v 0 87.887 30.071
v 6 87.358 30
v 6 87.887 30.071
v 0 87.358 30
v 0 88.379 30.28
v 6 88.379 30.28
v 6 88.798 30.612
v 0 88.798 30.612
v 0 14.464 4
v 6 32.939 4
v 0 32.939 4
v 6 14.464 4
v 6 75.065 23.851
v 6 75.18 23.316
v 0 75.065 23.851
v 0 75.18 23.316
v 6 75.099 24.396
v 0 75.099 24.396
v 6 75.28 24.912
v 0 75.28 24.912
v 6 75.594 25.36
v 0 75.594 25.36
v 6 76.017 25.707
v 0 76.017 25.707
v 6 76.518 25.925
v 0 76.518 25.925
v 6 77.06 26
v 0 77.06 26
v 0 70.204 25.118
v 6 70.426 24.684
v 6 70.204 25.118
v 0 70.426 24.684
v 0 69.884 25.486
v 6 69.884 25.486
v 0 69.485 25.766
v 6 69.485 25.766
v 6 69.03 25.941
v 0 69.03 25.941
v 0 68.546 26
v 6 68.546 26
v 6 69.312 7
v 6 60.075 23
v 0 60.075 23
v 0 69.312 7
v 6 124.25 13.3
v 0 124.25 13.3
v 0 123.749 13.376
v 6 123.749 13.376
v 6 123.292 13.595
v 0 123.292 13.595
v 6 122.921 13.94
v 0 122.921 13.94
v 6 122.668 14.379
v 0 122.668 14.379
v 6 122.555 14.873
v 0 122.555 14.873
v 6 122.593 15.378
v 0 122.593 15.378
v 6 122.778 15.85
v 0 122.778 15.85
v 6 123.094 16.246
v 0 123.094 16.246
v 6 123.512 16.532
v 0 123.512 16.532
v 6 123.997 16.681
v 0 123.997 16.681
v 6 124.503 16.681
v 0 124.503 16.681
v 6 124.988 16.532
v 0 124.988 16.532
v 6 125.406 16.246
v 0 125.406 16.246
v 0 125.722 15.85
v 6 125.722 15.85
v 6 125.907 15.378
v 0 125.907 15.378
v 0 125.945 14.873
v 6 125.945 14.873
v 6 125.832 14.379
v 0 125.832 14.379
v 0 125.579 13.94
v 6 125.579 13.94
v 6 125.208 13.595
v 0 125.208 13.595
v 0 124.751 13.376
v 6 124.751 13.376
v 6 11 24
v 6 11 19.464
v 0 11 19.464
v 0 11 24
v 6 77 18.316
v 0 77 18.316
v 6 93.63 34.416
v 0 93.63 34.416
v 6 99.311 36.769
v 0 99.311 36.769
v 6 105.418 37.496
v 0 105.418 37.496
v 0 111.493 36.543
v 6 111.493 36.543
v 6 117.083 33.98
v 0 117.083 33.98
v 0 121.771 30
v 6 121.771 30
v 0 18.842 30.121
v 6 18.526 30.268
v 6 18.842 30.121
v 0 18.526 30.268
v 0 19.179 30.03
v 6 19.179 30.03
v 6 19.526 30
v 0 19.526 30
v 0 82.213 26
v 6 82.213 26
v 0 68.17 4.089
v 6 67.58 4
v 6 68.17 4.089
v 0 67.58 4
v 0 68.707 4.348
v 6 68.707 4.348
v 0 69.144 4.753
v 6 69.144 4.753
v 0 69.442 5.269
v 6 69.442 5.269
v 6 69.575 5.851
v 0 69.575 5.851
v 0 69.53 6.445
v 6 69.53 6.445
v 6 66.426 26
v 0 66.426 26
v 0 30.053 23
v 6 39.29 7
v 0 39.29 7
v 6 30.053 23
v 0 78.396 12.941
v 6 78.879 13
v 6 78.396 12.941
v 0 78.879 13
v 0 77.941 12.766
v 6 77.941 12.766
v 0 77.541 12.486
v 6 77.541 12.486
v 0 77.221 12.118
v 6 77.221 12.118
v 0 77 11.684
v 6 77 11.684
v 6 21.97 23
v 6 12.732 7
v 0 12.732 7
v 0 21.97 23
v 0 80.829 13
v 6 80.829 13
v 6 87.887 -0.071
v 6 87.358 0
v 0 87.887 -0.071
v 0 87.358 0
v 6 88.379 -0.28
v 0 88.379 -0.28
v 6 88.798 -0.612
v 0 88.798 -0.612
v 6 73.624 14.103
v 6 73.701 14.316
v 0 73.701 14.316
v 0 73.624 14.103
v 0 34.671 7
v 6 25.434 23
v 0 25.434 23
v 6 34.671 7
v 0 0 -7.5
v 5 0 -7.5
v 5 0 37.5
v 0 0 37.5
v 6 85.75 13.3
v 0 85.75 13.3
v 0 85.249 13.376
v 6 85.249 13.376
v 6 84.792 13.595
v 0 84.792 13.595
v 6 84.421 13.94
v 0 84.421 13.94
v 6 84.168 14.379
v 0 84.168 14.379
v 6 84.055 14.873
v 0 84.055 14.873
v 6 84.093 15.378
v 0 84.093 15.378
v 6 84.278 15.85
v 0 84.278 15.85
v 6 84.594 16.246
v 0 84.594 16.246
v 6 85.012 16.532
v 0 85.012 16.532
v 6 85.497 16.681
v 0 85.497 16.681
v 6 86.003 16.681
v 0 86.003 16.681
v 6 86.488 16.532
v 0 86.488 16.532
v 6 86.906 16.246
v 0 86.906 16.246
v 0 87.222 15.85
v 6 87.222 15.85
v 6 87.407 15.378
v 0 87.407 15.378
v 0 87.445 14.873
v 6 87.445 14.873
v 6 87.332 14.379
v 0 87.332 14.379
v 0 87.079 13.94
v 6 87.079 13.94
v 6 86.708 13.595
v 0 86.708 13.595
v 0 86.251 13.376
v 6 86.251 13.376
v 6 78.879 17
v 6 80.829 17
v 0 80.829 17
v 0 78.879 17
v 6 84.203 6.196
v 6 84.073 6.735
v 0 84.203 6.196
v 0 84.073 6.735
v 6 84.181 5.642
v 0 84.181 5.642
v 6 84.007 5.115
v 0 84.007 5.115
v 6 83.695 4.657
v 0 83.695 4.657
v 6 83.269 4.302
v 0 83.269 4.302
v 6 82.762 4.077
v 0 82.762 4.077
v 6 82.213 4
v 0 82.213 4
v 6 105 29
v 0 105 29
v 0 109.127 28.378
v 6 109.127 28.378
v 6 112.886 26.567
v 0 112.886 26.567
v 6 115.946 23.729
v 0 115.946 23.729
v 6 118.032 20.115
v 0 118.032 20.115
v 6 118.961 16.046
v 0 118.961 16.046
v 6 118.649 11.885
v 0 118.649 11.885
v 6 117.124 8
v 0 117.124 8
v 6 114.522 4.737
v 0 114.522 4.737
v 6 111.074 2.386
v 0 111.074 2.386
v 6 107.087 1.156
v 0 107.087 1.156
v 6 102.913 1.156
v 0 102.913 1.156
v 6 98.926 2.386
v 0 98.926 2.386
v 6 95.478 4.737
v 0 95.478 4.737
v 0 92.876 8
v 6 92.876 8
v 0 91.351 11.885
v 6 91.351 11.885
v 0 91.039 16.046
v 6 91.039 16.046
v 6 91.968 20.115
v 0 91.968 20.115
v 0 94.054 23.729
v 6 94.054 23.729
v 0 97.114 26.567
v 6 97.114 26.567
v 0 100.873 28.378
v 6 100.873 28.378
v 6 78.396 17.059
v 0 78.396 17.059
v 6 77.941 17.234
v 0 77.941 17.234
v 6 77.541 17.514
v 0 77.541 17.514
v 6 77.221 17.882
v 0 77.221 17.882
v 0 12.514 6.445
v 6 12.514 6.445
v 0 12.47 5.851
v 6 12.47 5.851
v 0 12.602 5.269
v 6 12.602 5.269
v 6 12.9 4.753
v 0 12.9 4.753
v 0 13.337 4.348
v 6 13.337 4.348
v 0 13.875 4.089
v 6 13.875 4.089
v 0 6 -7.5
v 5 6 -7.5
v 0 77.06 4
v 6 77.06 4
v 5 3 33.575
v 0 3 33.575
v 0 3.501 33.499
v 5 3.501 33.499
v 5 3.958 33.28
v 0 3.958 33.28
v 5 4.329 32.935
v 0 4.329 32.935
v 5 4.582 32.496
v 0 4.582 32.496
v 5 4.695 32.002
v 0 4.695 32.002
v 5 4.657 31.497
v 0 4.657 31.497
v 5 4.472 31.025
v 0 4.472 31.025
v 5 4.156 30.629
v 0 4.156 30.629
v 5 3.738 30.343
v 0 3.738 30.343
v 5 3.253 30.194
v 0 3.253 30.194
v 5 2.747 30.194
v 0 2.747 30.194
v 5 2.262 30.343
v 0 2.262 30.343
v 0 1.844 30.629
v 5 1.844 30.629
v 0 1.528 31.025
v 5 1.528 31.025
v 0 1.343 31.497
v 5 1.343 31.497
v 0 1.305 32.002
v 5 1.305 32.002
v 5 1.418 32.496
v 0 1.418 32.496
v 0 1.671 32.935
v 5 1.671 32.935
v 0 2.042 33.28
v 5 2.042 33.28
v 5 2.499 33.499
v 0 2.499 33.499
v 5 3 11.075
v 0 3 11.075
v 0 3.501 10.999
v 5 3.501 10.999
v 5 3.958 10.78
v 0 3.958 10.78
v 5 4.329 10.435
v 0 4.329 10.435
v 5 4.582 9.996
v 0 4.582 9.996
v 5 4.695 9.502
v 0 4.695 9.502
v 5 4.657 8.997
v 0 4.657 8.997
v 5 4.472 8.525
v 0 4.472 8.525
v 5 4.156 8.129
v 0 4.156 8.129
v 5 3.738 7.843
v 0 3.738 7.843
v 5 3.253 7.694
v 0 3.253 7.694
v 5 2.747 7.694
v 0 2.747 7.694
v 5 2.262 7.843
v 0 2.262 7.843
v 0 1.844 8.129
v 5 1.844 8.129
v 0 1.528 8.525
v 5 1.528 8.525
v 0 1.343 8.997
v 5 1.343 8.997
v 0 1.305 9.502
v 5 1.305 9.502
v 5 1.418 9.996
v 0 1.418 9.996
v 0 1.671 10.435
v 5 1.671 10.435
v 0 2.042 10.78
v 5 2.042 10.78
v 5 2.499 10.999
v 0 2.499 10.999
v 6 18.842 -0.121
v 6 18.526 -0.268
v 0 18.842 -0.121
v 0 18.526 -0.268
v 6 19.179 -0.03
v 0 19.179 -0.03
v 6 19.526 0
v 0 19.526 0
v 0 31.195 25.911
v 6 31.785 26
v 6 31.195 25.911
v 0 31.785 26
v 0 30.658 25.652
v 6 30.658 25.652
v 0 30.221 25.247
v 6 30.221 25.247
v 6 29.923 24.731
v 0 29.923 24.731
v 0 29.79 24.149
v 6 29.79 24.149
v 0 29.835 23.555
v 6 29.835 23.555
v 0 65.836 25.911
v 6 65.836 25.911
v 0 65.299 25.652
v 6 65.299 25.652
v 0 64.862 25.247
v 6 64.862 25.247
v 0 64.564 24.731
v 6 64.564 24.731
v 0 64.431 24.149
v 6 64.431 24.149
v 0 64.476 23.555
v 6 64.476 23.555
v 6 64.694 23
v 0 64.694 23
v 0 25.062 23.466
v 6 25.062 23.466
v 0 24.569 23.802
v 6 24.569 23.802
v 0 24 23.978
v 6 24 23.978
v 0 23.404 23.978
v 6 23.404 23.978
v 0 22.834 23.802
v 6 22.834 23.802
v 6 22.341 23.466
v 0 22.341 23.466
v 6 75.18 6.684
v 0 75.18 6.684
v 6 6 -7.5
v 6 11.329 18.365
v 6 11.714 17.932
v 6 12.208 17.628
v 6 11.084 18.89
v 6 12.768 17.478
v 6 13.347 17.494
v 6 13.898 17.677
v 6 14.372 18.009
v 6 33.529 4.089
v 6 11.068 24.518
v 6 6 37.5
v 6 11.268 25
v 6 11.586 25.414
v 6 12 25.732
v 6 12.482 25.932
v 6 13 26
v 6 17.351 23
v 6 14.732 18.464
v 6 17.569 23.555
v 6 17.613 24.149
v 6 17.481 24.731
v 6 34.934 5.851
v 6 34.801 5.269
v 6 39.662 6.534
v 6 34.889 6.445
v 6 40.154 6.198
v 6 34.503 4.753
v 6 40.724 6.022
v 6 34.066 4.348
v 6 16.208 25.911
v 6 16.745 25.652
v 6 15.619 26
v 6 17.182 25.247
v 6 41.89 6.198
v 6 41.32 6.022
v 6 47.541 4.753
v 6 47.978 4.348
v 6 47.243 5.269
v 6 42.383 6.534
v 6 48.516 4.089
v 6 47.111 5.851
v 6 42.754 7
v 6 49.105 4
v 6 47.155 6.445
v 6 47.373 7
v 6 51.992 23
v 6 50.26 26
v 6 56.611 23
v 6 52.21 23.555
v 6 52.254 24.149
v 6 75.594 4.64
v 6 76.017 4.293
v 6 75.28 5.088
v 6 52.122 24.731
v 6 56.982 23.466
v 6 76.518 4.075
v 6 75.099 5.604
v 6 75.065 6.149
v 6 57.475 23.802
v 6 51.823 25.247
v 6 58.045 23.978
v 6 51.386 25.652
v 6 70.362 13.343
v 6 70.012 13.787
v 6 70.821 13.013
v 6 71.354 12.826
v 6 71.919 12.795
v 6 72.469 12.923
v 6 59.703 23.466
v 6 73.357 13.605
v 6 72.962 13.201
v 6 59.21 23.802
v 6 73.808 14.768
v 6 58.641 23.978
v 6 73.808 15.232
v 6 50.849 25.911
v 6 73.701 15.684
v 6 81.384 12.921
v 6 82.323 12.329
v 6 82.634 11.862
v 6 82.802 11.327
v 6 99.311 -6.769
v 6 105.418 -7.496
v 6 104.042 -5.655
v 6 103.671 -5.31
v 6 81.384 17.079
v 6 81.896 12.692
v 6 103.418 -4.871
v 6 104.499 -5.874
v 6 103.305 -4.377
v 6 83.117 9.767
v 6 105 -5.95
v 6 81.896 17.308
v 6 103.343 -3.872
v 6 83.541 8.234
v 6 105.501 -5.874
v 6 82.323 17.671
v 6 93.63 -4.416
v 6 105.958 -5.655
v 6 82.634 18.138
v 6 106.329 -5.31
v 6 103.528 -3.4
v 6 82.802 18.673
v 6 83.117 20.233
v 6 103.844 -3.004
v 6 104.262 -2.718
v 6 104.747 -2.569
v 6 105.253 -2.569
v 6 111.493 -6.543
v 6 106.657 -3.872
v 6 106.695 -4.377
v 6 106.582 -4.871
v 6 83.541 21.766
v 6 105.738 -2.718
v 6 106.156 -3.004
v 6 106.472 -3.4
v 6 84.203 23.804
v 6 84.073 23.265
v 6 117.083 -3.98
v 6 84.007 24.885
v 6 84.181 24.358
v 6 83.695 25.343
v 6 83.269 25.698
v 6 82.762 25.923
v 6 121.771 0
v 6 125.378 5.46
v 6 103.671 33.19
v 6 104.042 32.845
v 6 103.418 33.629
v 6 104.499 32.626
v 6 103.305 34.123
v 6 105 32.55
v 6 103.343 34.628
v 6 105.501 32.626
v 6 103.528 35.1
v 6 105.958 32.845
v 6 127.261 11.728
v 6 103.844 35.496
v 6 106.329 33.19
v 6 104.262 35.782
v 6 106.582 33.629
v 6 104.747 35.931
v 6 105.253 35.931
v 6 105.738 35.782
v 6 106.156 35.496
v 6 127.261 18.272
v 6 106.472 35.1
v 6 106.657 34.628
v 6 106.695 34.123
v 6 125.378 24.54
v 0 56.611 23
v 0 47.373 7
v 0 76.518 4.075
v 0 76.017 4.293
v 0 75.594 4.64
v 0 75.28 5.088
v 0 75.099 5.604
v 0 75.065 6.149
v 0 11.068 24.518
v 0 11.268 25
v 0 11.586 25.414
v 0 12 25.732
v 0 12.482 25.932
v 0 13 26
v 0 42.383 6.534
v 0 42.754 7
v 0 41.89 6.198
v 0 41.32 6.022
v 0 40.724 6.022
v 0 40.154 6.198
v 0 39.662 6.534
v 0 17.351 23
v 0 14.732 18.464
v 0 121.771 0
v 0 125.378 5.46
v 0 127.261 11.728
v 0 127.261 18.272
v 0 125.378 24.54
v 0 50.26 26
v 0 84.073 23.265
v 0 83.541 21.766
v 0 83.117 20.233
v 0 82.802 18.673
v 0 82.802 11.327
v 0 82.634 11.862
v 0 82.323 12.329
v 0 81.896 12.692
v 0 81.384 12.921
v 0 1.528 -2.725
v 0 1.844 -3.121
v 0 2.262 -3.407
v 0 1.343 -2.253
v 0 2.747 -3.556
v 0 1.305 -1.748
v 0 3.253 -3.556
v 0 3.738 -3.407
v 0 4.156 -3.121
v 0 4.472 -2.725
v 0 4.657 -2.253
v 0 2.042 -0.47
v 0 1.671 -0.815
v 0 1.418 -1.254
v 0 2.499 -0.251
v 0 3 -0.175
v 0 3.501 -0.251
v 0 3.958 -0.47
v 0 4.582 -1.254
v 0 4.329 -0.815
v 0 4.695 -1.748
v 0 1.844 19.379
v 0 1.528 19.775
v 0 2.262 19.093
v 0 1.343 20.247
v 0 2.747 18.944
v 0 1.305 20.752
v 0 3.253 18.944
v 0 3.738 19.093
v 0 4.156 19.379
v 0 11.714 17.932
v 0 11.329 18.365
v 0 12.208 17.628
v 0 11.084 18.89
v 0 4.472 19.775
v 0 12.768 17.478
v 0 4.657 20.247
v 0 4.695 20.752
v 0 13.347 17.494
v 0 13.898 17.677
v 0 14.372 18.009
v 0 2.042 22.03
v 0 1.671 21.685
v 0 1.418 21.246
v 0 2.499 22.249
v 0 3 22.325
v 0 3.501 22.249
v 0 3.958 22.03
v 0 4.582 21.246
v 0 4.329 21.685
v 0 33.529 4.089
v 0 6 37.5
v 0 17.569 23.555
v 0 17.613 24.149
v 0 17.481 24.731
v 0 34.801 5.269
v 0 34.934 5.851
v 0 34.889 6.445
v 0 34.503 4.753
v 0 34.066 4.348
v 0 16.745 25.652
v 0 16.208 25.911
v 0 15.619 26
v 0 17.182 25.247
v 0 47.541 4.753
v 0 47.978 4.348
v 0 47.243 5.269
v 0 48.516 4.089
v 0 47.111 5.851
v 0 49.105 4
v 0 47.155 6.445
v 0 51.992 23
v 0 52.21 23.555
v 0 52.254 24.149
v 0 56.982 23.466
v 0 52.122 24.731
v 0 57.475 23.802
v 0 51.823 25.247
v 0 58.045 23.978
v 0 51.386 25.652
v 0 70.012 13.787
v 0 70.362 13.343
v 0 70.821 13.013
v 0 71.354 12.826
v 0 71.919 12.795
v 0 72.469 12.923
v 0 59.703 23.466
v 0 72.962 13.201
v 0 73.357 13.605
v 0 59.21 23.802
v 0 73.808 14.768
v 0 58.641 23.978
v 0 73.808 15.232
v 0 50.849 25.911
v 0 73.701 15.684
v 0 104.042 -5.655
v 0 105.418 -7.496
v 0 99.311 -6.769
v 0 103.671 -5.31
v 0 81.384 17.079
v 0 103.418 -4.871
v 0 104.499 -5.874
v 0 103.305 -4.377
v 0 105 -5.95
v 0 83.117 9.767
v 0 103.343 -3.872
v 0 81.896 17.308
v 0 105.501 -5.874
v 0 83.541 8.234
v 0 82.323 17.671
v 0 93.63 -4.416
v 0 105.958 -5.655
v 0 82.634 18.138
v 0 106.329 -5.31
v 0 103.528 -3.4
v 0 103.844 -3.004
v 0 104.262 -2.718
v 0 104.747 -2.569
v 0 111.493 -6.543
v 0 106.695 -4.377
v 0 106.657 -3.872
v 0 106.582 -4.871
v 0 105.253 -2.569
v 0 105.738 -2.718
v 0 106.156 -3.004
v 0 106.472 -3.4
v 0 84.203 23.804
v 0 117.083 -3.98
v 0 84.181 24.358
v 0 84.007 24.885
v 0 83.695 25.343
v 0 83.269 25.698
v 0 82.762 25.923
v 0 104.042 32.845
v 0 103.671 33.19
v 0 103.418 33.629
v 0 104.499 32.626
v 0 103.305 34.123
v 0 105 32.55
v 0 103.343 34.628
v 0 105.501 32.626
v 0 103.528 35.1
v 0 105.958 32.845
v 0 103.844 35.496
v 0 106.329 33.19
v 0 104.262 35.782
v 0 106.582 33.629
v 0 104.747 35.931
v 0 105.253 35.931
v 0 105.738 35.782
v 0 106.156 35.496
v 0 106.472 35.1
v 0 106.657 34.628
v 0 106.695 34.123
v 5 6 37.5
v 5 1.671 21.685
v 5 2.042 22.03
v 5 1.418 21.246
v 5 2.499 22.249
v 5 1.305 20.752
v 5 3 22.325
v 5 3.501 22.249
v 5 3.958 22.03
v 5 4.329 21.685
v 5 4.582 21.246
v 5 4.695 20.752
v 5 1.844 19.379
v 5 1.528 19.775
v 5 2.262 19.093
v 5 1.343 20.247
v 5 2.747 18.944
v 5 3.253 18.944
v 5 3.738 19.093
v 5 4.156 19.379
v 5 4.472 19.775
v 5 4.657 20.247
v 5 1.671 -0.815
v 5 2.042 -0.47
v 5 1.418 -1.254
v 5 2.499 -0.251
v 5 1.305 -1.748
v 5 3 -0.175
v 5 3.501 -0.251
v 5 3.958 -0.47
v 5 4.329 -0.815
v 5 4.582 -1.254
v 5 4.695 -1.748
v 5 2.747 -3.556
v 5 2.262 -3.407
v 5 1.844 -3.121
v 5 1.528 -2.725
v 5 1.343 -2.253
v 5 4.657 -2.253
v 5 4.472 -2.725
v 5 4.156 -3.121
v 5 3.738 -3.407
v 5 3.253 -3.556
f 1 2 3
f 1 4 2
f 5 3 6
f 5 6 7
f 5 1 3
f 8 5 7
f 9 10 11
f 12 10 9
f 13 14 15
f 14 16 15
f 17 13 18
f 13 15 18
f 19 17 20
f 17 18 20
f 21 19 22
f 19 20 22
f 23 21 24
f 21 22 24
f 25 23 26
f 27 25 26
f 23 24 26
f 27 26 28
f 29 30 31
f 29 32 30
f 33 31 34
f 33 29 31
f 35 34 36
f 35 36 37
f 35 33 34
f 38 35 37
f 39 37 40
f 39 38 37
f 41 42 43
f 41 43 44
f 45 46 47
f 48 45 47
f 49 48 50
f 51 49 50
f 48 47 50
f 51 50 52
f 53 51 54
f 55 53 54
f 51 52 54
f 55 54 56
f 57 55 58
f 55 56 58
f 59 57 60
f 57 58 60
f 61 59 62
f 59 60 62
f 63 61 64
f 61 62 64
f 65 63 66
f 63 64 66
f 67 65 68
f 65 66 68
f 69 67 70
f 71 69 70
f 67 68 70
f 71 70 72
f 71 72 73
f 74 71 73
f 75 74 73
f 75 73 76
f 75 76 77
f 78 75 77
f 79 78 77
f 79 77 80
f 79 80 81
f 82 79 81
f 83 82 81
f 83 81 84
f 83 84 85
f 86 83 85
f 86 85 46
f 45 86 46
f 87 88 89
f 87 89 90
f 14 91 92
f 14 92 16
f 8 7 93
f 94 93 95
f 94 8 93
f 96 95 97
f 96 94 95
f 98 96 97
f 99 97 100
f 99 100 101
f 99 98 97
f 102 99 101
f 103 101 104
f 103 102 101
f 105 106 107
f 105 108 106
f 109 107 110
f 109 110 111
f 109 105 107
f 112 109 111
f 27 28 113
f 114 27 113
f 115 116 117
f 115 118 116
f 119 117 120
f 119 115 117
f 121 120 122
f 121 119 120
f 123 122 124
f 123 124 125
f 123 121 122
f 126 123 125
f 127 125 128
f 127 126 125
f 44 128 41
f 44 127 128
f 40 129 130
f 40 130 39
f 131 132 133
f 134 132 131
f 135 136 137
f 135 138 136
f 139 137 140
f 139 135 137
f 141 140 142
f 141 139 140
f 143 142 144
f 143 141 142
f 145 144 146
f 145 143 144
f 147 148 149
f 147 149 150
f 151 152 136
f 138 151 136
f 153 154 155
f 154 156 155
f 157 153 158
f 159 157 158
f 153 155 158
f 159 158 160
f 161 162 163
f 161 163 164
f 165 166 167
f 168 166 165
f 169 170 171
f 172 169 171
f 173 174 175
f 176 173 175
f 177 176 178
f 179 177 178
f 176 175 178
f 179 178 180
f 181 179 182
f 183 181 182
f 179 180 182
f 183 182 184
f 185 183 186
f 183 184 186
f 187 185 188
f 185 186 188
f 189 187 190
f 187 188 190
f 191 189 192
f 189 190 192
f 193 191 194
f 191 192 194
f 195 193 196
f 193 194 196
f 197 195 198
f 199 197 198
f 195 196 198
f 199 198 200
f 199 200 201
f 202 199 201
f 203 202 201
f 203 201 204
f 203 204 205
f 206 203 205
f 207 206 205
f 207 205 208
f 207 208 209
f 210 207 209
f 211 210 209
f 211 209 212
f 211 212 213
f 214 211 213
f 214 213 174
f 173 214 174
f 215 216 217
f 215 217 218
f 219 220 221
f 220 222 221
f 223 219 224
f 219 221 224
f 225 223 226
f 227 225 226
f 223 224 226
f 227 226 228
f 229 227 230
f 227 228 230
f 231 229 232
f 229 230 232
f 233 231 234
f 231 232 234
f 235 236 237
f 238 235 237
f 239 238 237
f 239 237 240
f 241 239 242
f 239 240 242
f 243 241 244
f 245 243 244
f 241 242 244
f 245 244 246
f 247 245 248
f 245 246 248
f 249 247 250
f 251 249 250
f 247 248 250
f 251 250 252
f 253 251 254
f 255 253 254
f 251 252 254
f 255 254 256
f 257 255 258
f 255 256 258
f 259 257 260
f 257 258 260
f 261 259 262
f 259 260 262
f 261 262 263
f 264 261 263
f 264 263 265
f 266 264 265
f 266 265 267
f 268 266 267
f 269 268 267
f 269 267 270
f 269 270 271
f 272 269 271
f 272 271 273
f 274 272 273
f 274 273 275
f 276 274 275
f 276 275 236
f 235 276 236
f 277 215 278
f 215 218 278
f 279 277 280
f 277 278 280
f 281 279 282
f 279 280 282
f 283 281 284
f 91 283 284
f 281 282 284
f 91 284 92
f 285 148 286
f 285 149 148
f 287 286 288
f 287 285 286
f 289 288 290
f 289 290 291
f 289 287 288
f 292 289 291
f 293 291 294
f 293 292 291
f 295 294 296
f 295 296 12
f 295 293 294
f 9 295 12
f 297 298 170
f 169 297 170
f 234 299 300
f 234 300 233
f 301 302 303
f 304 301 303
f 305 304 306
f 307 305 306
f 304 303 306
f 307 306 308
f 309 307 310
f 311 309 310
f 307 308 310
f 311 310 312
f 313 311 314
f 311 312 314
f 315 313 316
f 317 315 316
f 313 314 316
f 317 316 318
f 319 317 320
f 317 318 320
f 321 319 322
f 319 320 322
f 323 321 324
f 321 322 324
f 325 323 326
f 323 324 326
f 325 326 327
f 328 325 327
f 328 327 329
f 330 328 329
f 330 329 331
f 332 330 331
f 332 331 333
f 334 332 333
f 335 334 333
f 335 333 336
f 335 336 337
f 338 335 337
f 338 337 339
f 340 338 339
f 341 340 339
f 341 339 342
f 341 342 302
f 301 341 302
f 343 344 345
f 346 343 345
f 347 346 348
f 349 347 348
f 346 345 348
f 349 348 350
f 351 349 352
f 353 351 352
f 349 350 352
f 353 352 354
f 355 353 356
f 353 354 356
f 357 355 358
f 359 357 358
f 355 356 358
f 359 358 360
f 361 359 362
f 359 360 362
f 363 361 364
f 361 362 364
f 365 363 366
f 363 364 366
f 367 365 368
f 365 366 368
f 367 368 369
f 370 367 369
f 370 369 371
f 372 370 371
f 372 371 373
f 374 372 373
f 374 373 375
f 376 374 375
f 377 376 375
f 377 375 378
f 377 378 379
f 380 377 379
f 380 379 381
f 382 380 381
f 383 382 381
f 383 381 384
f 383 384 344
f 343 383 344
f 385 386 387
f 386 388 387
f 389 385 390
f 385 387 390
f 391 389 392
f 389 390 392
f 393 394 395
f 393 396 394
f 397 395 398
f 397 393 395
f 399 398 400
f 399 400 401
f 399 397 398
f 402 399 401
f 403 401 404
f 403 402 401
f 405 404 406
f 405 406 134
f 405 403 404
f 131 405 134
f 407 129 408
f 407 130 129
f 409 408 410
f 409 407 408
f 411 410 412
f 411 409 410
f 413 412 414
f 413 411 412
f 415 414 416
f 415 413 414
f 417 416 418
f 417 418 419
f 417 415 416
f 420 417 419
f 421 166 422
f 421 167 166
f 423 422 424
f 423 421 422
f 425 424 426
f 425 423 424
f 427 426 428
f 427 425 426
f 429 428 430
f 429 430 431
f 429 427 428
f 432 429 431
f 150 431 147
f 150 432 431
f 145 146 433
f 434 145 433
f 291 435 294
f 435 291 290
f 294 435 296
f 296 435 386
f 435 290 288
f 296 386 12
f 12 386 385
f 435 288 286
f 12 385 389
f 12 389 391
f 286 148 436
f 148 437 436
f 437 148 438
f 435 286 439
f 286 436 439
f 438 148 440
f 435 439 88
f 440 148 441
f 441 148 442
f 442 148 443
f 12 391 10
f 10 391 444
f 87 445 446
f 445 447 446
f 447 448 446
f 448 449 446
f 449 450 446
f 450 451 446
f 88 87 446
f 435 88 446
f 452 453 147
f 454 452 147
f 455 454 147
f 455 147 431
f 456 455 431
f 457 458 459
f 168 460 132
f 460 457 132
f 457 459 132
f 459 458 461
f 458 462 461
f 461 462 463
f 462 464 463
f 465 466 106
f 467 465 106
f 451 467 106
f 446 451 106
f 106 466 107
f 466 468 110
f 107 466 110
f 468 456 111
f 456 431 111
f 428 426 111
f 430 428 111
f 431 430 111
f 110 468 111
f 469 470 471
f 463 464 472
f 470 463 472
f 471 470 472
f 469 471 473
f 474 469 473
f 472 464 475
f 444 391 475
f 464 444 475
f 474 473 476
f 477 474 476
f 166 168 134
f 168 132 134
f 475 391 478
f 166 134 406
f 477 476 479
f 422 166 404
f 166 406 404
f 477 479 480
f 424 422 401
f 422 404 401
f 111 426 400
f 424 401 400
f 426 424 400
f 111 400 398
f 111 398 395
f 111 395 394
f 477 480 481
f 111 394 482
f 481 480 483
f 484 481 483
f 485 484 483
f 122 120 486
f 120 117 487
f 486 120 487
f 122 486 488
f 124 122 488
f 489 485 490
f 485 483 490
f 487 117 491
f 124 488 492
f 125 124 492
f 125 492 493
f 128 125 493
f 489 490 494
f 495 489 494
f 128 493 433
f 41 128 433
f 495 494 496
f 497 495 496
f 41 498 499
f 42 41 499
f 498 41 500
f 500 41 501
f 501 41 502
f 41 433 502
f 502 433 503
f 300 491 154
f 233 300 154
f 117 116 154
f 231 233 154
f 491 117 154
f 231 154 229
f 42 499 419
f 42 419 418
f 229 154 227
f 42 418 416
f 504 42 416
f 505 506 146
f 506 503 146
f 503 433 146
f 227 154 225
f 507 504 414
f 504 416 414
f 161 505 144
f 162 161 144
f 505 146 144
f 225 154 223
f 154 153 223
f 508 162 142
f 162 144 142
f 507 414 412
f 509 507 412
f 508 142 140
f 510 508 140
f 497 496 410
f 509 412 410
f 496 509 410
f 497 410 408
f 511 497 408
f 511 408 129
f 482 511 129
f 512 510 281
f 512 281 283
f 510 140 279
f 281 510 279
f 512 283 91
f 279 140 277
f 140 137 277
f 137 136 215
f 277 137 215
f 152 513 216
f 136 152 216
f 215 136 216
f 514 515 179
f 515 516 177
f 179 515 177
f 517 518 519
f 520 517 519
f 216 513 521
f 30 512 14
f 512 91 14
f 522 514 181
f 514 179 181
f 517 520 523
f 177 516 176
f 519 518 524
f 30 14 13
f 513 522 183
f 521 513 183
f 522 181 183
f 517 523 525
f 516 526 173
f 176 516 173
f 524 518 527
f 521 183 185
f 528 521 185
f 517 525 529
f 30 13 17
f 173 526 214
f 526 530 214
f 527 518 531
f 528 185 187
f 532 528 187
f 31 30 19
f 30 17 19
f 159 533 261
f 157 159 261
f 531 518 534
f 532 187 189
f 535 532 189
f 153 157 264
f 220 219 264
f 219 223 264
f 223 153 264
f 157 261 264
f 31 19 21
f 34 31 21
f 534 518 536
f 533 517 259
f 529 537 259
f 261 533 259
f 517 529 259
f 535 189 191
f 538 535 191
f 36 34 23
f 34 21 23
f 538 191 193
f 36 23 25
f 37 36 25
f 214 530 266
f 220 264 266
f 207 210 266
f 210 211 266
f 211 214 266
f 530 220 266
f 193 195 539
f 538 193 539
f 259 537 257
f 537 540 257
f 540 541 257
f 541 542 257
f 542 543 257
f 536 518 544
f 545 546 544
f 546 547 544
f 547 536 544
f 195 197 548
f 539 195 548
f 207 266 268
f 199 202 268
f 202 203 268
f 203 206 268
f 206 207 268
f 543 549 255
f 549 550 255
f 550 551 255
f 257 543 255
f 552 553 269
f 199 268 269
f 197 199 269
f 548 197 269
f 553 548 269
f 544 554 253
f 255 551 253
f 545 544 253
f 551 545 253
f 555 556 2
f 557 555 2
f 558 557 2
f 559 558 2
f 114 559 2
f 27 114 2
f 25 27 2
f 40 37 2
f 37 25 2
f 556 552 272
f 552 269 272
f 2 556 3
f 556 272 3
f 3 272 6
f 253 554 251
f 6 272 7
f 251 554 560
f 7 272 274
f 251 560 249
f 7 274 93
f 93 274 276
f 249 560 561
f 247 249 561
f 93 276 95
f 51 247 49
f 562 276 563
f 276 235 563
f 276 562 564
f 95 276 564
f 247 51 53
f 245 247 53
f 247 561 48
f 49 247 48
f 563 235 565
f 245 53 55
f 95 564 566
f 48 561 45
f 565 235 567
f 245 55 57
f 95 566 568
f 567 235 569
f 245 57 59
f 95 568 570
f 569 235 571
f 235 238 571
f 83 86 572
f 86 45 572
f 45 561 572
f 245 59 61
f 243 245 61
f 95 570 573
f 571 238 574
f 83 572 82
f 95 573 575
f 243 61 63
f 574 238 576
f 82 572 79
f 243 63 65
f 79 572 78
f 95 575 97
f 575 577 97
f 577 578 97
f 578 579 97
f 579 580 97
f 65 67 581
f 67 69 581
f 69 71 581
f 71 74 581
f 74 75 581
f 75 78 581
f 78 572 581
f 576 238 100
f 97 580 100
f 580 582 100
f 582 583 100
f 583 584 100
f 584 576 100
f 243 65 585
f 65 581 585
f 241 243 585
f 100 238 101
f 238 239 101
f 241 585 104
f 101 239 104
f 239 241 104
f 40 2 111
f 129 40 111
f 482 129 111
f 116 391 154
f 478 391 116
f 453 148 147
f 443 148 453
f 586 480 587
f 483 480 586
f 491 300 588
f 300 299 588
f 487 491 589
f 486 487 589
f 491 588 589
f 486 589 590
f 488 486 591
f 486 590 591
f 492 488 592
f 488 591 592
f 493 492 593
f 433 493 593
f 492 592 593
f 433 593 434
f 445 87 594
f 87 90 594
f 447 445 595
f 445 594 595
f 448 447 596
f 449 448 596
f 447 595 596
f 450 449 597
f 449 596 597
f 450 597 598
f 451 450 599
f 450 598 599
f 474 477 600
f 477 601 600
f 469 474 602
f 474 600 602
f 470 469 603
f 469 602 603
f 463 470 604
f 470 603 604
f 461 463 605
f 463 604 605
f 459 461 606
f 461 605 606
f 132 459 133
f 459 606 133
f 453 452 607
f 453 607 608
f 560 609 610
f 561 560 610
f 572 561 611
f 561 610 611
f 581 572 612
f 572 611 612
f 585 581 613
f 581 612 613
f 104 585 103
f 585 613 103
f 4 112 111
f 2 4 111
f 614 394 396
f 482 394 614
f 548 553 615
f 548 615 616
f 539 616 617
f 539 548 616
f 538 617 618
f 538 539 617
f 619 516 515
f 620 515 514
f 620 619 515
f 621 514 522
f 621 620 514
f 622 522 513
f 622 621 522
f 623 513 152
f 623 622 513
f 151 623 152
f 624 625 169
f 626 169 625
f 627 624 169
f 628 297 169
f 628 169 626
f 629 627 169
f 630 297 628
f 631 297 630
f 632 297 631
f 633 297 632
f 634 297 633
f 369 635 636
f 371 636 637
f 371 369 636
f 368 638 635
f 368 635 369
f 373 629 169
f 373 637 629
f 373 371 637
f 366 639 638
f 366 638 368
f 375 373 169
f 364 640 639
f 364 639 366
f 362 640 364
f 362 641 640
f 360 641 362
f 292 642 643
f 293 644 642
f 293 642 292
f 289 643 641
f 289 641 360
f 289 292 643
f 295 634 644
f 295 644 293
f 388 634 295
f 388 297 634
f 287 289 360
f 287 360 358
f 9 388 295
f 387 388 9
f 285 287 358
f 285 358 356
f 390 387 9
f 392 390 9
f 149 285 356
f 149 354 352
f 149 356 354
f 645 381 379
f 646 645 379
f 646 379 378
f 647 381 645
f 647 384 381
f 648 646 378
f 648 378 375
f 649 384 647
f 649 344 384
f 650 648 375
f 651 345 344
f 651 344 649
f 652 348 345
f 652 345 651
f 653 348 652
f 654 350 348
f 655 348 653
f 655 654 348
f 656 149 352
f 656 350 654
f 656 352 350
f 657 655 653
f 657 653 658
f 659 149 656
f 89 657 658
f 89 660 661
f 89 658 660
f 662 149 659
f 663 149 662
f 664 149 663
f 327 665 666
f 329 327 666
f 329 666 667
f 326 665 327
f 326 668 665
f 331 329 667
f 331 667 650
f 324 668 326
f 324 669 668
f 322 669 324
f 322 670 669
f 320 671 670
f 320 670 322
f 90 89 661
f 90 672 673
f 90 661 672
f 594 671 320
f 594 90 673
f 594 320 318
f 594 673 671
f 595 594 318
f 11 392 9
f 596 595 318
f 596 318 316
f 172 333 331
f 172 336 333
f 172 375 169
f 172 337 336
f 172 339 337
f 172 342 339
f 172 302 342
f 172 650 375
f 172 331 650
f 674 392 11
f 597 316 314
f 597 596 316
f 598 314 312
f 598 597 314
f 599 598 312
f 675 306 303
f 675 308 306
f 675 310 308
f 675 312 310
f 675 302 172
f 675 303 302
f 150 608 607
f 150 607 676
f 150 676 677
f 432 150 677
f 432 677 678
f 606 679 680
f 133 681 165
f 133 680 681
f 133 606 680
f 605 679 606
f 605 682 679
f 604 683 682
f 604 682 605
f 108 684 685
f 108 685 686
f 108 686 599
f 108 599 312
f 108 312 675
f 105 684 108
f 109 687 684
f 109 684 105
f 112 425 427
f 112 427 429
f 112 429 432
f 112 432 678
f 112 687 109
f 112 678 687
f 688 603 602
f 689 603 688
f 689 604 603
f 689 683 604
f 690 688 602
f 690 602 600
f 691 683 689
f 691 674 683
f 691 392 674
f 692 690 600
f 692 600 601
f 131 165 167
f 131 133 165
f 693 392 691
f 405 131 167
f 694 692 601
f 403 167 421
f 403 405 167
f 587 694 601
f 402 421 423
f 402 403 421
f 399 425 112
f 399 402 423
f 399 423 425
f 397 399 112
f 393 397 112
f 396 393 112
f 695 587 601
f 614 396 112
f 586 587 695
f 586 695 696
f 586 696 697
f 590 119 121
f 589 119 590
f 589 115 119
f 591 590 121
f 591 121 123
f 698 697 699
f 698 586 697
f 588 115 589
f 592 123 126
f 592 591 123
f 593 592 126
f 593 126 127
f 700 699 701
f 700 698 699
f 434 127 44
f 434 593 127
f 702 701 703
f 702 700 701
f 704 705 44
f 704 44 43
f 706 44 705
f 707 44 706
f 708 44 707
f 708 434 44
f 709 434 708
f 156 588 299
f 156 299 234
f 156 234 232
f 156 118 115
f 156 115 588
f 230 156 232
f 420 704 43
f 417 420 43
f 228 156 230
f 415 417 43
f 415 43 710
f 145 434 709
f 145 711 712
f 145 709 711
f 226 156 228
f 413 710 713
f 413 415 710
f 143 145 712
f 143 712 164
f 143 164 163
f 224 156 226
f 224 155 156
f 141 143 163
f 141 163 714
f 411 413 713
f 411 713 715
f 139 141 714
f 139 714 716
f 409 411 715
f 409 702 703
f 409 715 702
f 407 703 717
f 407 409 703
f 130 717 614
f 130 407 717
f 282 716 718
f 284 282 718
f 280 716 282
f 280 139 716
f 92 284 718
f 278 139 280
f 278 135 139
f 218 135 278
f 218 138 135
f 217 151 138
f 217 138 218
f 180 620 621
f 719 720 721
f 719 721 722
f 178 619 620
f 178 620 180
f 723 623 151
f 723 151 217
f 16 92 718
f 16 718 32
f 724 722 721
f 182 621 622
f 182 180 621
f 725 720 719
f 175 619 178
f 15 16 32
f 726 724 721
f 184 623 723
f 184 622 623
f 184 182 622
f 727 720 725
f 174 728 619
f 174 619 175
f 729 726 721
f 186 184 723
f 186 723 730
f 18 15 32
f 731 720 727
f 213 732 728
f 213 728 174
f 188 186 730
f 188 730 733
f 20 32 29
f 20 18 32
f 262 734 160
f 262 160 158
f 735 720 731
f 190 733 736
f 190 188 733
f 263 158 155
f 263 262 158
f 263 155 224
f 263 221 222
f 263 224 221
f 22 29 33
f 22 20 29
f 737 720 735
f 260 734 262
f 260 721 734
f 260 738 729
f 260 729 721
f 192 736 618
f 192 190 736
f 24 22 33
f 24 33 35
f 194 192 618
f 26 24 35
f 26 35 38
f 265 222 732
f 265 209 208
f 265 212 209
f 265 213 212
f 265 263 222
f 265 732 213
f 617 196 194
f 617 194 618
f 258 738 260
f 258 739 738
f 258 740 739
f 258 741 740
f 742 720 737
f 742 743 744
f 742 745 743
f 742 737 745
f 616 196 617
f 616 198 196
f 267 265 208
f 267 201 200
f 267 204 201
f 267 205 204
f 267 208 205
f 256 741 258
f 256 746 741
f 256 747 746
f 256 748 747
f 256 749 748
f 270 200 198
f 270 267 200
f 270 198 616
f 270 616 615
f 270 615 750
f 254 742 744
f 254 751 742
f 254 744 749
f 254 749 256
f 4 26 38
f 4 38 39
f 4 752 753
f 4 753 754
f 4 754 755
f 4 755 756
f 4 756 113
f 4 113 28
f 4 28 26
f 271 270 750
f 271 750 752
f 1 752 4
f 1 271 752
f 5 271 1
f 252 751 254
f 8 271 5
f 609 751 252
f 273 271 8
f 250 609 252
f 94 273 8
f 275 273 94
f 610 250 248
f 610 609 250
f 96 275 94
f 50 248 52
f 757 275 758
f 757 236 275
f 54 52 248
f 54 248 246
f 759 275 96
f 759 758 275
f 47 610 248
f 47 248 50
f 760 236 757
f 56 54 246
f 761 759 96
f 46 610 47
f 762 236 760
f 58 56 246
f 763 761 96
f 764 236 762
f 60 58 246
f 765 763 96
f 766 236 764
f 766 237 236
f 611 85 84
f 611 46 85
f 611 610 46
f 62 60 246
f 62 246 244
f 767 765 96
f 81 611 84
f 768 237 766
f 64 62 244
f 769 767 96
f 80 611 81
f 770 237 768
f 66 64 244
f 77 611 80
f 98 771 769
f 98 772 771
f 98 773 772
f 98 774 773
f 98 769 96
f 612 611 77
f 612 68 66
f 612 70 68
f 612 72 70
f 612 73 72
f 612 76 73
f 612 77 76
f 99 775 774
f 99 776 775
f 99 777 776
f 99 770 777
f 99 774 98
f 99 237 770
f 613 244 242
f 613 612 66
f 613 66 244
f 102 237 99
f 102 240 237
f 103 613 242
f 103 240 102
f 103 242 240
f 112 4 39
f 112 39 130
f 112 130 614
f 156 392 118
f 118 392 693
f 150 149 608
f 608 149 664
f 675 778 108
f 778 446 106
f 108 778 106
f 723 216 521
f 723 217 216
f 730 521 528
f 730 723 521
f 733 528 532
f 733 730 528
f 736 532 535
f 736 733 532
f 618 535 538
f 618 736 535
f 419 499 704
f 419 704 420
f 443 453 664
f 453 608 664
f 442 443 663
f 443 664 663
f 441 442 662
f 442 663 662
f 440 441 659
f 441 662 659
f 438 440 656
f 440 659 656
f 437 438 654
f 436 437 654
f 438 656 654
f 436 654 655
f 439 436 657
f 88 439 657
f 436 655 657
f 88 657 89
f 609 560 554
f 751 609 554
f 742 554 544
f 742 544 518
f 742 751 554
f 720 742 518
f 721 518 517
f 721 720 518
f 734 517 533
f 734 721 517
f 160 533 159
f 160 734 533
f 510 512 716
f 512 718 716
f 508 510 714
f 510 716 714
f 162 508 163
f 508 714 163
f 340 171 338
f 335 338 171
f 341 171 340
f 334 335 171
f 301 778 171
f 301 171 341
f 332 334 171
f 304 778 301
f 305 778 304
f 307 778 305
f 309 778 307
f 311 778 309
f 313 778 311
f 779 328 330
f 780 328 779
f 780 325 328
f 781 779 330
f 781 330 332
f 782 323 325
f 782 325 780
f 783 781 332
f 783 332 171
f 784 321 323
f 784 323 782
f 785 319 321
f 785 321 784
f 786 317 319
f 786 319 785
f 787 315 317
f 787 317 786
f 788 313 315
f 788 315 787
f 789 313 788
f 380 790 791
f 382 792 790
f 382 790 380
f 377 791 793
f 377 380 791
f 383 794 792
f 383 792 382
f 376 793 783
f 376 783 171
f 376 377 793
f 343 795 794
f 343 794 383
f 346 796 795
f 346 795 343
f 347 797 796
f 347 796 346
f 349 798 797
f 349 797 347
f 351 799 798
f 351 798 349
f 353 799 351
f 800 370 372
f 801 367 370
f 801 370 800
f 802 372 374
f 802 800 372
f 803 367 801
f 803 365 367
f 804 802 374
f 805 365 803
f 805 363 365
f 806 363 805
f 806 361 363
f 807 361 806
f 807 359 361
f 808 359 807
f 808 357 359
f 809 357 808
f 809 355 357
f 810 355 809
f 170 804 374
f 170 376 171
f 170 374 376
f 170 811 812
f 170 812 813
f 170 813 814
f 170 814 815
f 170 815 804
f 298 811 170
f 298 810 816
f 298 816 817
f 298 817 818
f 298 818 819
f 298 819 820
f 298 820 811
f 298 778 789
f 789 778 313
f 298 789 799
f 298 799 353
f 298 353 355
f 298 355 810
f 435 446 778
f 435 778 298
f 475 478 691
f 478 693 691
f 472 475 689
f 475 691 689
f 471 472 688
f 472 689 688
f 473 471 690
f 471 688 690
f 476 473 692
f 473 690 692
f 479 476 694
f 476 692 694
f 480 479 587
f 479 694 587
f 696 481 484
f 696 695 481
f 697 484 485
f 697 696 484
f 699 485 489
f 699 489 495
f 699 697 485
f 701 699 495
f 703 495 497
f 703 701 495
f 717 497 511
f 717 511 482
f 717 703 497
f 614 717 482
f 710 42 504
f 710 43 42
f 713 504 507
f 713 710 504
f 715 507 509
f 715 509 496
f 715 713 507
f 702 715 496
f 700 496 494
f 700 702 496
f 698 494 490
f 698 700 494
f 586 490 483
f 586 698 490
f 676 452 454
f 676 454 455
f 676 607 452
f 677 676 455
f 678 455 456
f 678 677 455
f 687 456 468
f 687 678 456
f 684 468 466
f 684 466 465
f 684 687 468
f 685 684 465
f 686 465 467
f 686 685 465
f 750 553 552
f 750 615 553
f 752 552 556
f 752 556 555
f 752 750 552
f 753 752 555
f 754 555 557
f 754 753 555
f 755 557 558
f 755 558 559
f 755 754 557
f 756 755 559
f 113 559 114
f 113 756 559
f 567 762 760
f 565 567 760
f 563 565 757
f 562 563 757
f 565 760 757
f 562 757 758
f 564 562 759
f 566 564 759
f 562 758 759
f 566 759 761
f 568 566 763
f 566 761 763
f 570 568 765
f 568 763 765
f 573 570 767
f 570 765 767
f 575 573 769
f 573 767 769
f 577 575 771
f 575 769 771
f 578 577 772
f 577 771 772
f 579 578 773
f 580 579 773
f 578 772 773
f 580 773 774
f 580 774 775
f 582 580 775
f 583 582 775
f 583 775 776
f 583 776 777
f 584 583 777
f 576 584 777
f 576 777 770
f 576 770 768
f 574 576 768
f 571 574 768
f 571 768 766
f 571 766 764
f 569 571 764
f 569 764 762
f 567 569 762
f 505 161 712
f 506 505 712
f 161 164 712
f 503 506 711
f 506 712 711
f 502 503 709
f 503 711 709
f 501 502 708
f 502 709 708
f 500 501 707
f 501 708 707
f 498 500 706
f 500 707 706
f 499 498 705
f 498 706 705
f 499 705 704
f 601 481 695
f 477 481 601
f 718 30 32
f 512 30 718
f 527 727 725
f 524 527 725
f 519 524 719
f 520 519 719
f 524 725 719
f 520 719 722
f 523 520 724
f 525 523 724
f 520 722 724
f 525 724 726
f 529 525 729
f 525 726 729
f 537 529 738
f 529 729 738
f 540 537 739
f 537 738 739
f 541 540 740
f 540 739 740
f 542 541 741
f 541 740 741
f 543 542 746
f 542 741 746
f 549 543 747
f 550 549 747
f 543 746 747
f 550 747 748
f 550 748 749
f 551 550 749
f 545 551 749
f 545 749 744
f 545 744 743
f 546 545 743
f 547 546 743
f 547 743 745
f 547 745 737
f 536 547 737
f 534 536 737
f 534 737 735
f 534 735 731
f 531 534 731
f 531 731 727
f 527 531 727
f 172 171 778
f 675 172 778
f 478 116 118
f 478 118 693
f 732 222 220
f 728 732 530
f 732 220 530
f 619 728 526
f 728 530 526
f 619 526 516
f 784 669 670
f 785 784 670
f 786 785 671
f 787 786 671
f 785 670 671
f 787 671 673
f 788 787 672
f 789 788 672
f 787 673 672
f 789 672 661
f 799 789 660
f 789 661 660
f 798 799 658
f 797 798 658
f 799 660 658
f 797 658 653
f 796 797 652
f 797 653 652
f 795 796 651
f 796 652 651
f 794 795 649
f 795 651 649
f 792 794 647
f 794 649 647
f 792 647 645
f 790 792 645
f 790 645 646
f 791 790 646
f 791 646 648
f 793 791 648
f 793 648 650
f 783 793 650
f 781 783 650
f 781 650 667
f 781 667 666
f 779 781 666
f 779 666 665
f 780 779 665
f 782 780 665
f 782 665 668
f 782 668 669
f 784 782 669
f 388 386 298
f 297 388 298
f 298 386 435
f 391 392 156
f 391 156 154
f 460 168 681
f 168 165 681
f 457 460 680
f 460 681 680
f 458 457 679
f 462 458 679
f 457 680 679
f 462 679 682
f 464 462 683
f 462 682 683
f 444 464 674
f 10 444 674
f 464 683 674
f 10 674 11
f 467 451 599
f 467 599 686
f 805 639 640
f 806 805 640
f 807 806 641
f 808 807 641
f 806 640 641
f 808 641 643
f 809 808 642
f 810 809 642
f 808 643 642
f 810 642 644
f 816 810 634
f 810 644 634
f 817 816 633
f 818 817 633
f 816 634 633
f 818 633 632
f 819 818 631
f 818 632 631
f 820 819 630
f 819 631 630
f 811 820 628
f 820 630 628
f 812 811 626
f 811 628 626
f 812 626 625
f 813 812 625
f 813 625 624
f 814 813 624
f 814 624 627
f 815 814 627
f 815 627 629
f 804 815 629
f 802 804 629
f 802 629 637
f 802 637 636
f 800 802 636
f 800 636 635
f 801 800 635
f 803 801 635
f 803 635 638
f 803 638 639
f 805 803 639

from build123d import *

# Parameters (mm, degrees)
SKETCH_1_W          = 6
SKETCH_1_H          = 30
EXTRUDE_1_DEPTH     = 227
SKETCH_2_R          = 22.5
EXTRUDE_2_DEPTH     = 6
SKETCH_3_R          = 14
CUT_EXTRUDE_1_DEPTH = 231.154839184
HOLE_WIZARD_M32_D   = 3.4
EXTRUDE_3_DEPTH     = 6
HOLE_WIZARD_M31_D   = 3.4
SKETCH_14_W         = 45
SKETCH_14_H         = 6
CUT_EXTRUDE_2_DEPTH = 1
CUT_EXTRUDE_START   = -6
CUT_EXTRUDE_3_DEPTH = 6
CUT_EXTRUDE_5_REACH = 135.036
FILLET_2_R          = 2


with BuildPart() as part:
    # Эскиз1 → Бобышка-Вытянуть1 (new body)
    with BuildSketch(Plane(origin=(0, 0, 0), x_dir=(1, 0, 0), z_dir=(0, 1, 0))):
        with Locations((3, -15)):
            Rectangle(SKETCH_1_W, SKETCH_1_H)
    extrude(amount=EXTRUDE_1_DEPTH)

    # Эскиз2 → Бобышка-Вытянуть2 (add)
    with BuildSketch(Plane.ZY):
        with Locations((15, 105)):
            Circle(SKETCH_2_R)
    extrude(amount=-EXTRUDE_2_DEPTH)

    # Эскиз3 → Вырез-Вытянуть1 (cut, through all)
    with BuildSketch(Plane.ZY):
        with Locations((15, 105)):
            Circle(SKETCH_3_R)
    extrude(amount=-CUT_EXTRUDE_1_DEPTH, mode=Mode.SUBTRACT)

    # Отверстие с зазором M32 (through all)
    with Locations(Plane(origin=(6, -25.024735225, 7.262908886), x_dir=(0, 0, 1), z_dir=(1, 0, 0))):
        with Locations((7.737091114, -149.274735225), (-11.512908886, -130.024735225), (7.737091114, -110.774735225), (26.987091114, -130.024735225)):
            Hole(HOLE_WIZARD_M32_D / 2)

    # Эскиз11 → Бобышка-Вытянуть3 (add)
    with BuildSketch(Plane(origin=(6, 0, 0), x_dir=(0, 0, -1), z_dir=(1, 0, 0))):
        Polygon((0, 18.990381057), (7.5, 6), (7.5, 0), (-37.5, 0), (-37.5, 6), (-30, 18.990381057), align=None)
    extrude(amount=-EXTRUDE_3_DEPTH)

    # Отверстие с зазором M31 (through all)
    with Locations(Plane(origin=(6, 0, 0), x_dir=(0, 0, -1), z_dir=(1, 0, 0))):
        with Locations((-31.875, 3), (-20.625, 3), (-9.375, 3), (1.875, 3)):
            Hole(HOLE_WIZARD_M31_D / 2)

    # Эскиз14 → Вырез-Вытянуть2 (cut)
    with BuildSketch(Plane(origin=(6, 0, 0), x_dir=(0, 0, -1), z_dir=(1, 0, 0))):
        with Locations((-15, 3)):
            Rectangle(SKETCH_14_W, SKETCH_14_H)
    extrude(amount=-CUT_EXTRUDE_2_DEPTH, mode=Mode.SUBTRACT)

    # Эскиз15 → Вырез-Вытянуть3 (cut)
    with BuildSketch(Plane(origin=(6, 0, 0), x_dir=(0, 0, -1), z_dir=(1, 0, 0)).offset(CUT_EXTRUDE_START)):
        with BuildLine():
            Line((-30, 227), (0, 227))
            Line((0, 227), (0, 121.770509831))
            ThreePointArc((0, 121.770509831), (-15, 127.5), (-30, 121.770509831))
            Line((-30, 121.770509831), (-30, 227))
        make_face()
    extrude(amount=CUT_EXTRUDE_3_DEPTH, mode=Mode.SUBTRACT)

    # Эскиз17 → Вырез-Вытянуть5 (cut, up to next)
    with BuildSketch(Plane(origin=(6, 0, 0), x_dir=(0, 0, -1), z_dir=(1, 0, 0)), mode=Mode.PRIVATE) as cut_extrude_5_sk1:
        with BuildLine():
            Line((-17, 82.589065169), (-17, 77.479065169))
            Line((-17, 77.479065169), (-26, 74.203333061))
            Line((-26, 74.203333061), (-26, 85.372213574))
            ThreePointArc((-26, 85.372213574), (-21.647291084, 83.504337153), (-17, 82.589065169))
        make_face()
    cut_extrude_5_tool1 = extrude(cut_extrude_5_sk1.sketch, amount=-CUT_EXTRUDE_5_REACH, mode=Mode.PRIVATE) & part.part
    # Эскиз17 → Вырез-Вытянуть5 (cut, up to next)
    with BuildSketch(Plane(origin=(6, 0, 0), x_dir=(0, 0, -1), z_dir=(1, 0, 0)), mode=Mode.PRIVATE) as cut_extrude_5_sk2:
        with BuildLine():
            Line((-13, 82.589065169), (-13, 77.479065169))
            Line((-13, 77.479065169), (-4, 74.203333061))
            Line((-4, 74.203333061), (-4, 85.372213574))
            ThreePointArc((-4, 85.372213574), (-8.352708916, 83.504337153), (-13, 82.589065169))
        make_face()
    cut_extrude_5_tool2 = extrude(cut_extrude_5_sk2.sketch, amount=-CUT_EXTRUDE_5_REACH, mode=Mode.PRIVATE) & part.part
    # Эскиз17 → Вырез-Вытянуть5 (cut, up to next)
    with BuildSketch(Plane(origin=(6, 0, 0), x_dir=(0, 0, -1), z_dir=(1, 0, 0)), mode=Mode.PRIVATE) as cut_extrude_5_sk3:
        Polygon((-26, 69.946621971), (-15, 73.950294548), (-10.072966814, 72.157001125), (-26, 62.961524227), align=None)
    cut_extrude_5_tool3 = extrude(cut_extrude_5_sk3.sketch, amount=-CUT_EXTRUDE_5_REACH, mode=Mode.PRIVATE) & part.part
    # Эскиз17 → Вырез-Вытянуть5 (cut, up to next)
    with BuildSketch(Plane(origin=(6, 0, 0), x_dir=(0, 0, -1), z_dir=(1, 0, 0)), mode=Mode.PRIVATE) as cut_extrude_5_sk4:
        Polygon((-4, 71.044427996), (-4, 45.641016151), (-26, 58.342722074), align=None)
    cut_extrude_5_tool4 = extrude(cut_extrude_5_sk4.sketch, amount=-CUT_EXTRUDE_5_REACH, mode=Mode.PRIVATE) & part.part
    # Эскиз17 → Вырез-Вытянуть5 (cut, up to next)
    with BuildSketch(Plane(origin=(6, 0, 0), x_dir=(0, 0, -1), z_dir=(1, 0, 0)), mode=Mode.PRIVATE) as cut_extrude_5_sk5:
        Polygon((-26, 53.72391992), (-4, 41.022213998), (-26, 28.320508076), align=None)
    cut_extrude_5_tool5 = extrude(cut_extrude_5_sk5.sketch, amount=-CUT_EXTRUDE_5_REACH, mode=Mode.PRIVATE) & part.part
    # Эскиз17 → Вырез-Вытянуть5 (cut, up to next)
    with BuildSketch(Plane(origin=(6, 0, 0), x_dir=(0, 0, -1), z_dir=(1, 0, 0)), mode=Mode.PRIVATE) as cut_extrude_5_sk6:
        Polygon((-26, 23.701705922), (-4, 36.403411844), (-4, 11), align=None)
    cut_extrude_5_tool6 = extrude(cut_extrude_5_sk6.sketch, amount=-CUT_EXTRUDE_5_REACH, mode=Mode.PRIVATE) & part.part
    # Эскиз17 → Вырез-Вытянуть5 (cut, up to next)
    with BuildSketch(Plane(origin=(6, 0, 0), x_dir=(0, 0, -1), z_dir=(1, 0, 0)), mode=Mode.PRIVATE) as cut_extrude_5_sk7:
        Polygon((-26, 19.082903769), (-12, 11), (-26, 11), align=None)
    cut_extrude_5_tool7 = extrude(cut_extrude_5_sk7.sketch, amount=-CUT_EXTRUDE_5_REACH, mode=Mode.PRIVATE) & part.part
    add(cut_extrude_5_tool1.solids().sort_by_distance((6, 79.721351, 22.080636))[0], mode=Mode.SUBTRACT)
    add(cut_extrude_5_tool2.solids().sort_by_distance((6, 79.721351, 7.919364))[0], mode=Mode.SUBTRACT)
    add(cut_extrude_5_tool3.solids().sort_by_distance((6, 69.313955, 19.731103))[0], mode=Mode.SUBTRACT)
    add(cut_extrude_5_tool4.solids().sort_by_distance((6, 58.342722, 11.333333))[0], mode=Mode.SUBTRACT)
    add(cut_extrude_5_tool5.solids().sort_by_distance((6, 41.022214, 18.666667))[0], mode=Mode.SUBTRACT)
    add(cut_extrude_5_tool6.solids().sort_by_distance((6, 23.701706, 11.333333))[0], mode=Mode.SUBTRACT)
    add(cut_extrude_5_tool7.solids().sort_by_distance((6, 13.694301, 21.333333))[0], mode=Mode.SUBTRACT)

    # Скругление2
    fillet_2_edges = [part.edges().sort_by_distance(p)[0] for p in [
        (3, 88.229490169, 0),
        (3, 85.372213574, 26),
        (3, 82.589065169, 17),
        (3, 77.479065169, 17),
        (3, 74.203333061, 26),
        (3, 82.589065169, 13),
        (3, 85.372213574, 4),
        (3, 74.203333061, 4),
        (3, 77.479065169, 13),
        (3, 62.961524227, 26),
        (3, 69.946621971, 26),
        (3, 73.950294548, 15),
        (3, 72.157001125, 10.072966814),
        (3, 28.320508076, 26),
        (3, 53.72391992, 26),
        (3, 41.022213998, 4),
        (3, 58.342722074, 26),
        (3, 71.044427996, 4),
        (3, 45.641016151, 4),
        (3, 88.229490169, 30),
        (3, 11, 4),
        (3, 23.701705922, 26),
        (3, 36.403411844, 4),
        (3, 11, 26),
        (3, 19.082903769, 26),
        (3, 11, 12),
        (3, 18.990381057, 30),
        (3, 18.990381057, 0),
    ]]
    fillet(fillet_2_edges, radius=FILLET_2_R)


solid = part.part
